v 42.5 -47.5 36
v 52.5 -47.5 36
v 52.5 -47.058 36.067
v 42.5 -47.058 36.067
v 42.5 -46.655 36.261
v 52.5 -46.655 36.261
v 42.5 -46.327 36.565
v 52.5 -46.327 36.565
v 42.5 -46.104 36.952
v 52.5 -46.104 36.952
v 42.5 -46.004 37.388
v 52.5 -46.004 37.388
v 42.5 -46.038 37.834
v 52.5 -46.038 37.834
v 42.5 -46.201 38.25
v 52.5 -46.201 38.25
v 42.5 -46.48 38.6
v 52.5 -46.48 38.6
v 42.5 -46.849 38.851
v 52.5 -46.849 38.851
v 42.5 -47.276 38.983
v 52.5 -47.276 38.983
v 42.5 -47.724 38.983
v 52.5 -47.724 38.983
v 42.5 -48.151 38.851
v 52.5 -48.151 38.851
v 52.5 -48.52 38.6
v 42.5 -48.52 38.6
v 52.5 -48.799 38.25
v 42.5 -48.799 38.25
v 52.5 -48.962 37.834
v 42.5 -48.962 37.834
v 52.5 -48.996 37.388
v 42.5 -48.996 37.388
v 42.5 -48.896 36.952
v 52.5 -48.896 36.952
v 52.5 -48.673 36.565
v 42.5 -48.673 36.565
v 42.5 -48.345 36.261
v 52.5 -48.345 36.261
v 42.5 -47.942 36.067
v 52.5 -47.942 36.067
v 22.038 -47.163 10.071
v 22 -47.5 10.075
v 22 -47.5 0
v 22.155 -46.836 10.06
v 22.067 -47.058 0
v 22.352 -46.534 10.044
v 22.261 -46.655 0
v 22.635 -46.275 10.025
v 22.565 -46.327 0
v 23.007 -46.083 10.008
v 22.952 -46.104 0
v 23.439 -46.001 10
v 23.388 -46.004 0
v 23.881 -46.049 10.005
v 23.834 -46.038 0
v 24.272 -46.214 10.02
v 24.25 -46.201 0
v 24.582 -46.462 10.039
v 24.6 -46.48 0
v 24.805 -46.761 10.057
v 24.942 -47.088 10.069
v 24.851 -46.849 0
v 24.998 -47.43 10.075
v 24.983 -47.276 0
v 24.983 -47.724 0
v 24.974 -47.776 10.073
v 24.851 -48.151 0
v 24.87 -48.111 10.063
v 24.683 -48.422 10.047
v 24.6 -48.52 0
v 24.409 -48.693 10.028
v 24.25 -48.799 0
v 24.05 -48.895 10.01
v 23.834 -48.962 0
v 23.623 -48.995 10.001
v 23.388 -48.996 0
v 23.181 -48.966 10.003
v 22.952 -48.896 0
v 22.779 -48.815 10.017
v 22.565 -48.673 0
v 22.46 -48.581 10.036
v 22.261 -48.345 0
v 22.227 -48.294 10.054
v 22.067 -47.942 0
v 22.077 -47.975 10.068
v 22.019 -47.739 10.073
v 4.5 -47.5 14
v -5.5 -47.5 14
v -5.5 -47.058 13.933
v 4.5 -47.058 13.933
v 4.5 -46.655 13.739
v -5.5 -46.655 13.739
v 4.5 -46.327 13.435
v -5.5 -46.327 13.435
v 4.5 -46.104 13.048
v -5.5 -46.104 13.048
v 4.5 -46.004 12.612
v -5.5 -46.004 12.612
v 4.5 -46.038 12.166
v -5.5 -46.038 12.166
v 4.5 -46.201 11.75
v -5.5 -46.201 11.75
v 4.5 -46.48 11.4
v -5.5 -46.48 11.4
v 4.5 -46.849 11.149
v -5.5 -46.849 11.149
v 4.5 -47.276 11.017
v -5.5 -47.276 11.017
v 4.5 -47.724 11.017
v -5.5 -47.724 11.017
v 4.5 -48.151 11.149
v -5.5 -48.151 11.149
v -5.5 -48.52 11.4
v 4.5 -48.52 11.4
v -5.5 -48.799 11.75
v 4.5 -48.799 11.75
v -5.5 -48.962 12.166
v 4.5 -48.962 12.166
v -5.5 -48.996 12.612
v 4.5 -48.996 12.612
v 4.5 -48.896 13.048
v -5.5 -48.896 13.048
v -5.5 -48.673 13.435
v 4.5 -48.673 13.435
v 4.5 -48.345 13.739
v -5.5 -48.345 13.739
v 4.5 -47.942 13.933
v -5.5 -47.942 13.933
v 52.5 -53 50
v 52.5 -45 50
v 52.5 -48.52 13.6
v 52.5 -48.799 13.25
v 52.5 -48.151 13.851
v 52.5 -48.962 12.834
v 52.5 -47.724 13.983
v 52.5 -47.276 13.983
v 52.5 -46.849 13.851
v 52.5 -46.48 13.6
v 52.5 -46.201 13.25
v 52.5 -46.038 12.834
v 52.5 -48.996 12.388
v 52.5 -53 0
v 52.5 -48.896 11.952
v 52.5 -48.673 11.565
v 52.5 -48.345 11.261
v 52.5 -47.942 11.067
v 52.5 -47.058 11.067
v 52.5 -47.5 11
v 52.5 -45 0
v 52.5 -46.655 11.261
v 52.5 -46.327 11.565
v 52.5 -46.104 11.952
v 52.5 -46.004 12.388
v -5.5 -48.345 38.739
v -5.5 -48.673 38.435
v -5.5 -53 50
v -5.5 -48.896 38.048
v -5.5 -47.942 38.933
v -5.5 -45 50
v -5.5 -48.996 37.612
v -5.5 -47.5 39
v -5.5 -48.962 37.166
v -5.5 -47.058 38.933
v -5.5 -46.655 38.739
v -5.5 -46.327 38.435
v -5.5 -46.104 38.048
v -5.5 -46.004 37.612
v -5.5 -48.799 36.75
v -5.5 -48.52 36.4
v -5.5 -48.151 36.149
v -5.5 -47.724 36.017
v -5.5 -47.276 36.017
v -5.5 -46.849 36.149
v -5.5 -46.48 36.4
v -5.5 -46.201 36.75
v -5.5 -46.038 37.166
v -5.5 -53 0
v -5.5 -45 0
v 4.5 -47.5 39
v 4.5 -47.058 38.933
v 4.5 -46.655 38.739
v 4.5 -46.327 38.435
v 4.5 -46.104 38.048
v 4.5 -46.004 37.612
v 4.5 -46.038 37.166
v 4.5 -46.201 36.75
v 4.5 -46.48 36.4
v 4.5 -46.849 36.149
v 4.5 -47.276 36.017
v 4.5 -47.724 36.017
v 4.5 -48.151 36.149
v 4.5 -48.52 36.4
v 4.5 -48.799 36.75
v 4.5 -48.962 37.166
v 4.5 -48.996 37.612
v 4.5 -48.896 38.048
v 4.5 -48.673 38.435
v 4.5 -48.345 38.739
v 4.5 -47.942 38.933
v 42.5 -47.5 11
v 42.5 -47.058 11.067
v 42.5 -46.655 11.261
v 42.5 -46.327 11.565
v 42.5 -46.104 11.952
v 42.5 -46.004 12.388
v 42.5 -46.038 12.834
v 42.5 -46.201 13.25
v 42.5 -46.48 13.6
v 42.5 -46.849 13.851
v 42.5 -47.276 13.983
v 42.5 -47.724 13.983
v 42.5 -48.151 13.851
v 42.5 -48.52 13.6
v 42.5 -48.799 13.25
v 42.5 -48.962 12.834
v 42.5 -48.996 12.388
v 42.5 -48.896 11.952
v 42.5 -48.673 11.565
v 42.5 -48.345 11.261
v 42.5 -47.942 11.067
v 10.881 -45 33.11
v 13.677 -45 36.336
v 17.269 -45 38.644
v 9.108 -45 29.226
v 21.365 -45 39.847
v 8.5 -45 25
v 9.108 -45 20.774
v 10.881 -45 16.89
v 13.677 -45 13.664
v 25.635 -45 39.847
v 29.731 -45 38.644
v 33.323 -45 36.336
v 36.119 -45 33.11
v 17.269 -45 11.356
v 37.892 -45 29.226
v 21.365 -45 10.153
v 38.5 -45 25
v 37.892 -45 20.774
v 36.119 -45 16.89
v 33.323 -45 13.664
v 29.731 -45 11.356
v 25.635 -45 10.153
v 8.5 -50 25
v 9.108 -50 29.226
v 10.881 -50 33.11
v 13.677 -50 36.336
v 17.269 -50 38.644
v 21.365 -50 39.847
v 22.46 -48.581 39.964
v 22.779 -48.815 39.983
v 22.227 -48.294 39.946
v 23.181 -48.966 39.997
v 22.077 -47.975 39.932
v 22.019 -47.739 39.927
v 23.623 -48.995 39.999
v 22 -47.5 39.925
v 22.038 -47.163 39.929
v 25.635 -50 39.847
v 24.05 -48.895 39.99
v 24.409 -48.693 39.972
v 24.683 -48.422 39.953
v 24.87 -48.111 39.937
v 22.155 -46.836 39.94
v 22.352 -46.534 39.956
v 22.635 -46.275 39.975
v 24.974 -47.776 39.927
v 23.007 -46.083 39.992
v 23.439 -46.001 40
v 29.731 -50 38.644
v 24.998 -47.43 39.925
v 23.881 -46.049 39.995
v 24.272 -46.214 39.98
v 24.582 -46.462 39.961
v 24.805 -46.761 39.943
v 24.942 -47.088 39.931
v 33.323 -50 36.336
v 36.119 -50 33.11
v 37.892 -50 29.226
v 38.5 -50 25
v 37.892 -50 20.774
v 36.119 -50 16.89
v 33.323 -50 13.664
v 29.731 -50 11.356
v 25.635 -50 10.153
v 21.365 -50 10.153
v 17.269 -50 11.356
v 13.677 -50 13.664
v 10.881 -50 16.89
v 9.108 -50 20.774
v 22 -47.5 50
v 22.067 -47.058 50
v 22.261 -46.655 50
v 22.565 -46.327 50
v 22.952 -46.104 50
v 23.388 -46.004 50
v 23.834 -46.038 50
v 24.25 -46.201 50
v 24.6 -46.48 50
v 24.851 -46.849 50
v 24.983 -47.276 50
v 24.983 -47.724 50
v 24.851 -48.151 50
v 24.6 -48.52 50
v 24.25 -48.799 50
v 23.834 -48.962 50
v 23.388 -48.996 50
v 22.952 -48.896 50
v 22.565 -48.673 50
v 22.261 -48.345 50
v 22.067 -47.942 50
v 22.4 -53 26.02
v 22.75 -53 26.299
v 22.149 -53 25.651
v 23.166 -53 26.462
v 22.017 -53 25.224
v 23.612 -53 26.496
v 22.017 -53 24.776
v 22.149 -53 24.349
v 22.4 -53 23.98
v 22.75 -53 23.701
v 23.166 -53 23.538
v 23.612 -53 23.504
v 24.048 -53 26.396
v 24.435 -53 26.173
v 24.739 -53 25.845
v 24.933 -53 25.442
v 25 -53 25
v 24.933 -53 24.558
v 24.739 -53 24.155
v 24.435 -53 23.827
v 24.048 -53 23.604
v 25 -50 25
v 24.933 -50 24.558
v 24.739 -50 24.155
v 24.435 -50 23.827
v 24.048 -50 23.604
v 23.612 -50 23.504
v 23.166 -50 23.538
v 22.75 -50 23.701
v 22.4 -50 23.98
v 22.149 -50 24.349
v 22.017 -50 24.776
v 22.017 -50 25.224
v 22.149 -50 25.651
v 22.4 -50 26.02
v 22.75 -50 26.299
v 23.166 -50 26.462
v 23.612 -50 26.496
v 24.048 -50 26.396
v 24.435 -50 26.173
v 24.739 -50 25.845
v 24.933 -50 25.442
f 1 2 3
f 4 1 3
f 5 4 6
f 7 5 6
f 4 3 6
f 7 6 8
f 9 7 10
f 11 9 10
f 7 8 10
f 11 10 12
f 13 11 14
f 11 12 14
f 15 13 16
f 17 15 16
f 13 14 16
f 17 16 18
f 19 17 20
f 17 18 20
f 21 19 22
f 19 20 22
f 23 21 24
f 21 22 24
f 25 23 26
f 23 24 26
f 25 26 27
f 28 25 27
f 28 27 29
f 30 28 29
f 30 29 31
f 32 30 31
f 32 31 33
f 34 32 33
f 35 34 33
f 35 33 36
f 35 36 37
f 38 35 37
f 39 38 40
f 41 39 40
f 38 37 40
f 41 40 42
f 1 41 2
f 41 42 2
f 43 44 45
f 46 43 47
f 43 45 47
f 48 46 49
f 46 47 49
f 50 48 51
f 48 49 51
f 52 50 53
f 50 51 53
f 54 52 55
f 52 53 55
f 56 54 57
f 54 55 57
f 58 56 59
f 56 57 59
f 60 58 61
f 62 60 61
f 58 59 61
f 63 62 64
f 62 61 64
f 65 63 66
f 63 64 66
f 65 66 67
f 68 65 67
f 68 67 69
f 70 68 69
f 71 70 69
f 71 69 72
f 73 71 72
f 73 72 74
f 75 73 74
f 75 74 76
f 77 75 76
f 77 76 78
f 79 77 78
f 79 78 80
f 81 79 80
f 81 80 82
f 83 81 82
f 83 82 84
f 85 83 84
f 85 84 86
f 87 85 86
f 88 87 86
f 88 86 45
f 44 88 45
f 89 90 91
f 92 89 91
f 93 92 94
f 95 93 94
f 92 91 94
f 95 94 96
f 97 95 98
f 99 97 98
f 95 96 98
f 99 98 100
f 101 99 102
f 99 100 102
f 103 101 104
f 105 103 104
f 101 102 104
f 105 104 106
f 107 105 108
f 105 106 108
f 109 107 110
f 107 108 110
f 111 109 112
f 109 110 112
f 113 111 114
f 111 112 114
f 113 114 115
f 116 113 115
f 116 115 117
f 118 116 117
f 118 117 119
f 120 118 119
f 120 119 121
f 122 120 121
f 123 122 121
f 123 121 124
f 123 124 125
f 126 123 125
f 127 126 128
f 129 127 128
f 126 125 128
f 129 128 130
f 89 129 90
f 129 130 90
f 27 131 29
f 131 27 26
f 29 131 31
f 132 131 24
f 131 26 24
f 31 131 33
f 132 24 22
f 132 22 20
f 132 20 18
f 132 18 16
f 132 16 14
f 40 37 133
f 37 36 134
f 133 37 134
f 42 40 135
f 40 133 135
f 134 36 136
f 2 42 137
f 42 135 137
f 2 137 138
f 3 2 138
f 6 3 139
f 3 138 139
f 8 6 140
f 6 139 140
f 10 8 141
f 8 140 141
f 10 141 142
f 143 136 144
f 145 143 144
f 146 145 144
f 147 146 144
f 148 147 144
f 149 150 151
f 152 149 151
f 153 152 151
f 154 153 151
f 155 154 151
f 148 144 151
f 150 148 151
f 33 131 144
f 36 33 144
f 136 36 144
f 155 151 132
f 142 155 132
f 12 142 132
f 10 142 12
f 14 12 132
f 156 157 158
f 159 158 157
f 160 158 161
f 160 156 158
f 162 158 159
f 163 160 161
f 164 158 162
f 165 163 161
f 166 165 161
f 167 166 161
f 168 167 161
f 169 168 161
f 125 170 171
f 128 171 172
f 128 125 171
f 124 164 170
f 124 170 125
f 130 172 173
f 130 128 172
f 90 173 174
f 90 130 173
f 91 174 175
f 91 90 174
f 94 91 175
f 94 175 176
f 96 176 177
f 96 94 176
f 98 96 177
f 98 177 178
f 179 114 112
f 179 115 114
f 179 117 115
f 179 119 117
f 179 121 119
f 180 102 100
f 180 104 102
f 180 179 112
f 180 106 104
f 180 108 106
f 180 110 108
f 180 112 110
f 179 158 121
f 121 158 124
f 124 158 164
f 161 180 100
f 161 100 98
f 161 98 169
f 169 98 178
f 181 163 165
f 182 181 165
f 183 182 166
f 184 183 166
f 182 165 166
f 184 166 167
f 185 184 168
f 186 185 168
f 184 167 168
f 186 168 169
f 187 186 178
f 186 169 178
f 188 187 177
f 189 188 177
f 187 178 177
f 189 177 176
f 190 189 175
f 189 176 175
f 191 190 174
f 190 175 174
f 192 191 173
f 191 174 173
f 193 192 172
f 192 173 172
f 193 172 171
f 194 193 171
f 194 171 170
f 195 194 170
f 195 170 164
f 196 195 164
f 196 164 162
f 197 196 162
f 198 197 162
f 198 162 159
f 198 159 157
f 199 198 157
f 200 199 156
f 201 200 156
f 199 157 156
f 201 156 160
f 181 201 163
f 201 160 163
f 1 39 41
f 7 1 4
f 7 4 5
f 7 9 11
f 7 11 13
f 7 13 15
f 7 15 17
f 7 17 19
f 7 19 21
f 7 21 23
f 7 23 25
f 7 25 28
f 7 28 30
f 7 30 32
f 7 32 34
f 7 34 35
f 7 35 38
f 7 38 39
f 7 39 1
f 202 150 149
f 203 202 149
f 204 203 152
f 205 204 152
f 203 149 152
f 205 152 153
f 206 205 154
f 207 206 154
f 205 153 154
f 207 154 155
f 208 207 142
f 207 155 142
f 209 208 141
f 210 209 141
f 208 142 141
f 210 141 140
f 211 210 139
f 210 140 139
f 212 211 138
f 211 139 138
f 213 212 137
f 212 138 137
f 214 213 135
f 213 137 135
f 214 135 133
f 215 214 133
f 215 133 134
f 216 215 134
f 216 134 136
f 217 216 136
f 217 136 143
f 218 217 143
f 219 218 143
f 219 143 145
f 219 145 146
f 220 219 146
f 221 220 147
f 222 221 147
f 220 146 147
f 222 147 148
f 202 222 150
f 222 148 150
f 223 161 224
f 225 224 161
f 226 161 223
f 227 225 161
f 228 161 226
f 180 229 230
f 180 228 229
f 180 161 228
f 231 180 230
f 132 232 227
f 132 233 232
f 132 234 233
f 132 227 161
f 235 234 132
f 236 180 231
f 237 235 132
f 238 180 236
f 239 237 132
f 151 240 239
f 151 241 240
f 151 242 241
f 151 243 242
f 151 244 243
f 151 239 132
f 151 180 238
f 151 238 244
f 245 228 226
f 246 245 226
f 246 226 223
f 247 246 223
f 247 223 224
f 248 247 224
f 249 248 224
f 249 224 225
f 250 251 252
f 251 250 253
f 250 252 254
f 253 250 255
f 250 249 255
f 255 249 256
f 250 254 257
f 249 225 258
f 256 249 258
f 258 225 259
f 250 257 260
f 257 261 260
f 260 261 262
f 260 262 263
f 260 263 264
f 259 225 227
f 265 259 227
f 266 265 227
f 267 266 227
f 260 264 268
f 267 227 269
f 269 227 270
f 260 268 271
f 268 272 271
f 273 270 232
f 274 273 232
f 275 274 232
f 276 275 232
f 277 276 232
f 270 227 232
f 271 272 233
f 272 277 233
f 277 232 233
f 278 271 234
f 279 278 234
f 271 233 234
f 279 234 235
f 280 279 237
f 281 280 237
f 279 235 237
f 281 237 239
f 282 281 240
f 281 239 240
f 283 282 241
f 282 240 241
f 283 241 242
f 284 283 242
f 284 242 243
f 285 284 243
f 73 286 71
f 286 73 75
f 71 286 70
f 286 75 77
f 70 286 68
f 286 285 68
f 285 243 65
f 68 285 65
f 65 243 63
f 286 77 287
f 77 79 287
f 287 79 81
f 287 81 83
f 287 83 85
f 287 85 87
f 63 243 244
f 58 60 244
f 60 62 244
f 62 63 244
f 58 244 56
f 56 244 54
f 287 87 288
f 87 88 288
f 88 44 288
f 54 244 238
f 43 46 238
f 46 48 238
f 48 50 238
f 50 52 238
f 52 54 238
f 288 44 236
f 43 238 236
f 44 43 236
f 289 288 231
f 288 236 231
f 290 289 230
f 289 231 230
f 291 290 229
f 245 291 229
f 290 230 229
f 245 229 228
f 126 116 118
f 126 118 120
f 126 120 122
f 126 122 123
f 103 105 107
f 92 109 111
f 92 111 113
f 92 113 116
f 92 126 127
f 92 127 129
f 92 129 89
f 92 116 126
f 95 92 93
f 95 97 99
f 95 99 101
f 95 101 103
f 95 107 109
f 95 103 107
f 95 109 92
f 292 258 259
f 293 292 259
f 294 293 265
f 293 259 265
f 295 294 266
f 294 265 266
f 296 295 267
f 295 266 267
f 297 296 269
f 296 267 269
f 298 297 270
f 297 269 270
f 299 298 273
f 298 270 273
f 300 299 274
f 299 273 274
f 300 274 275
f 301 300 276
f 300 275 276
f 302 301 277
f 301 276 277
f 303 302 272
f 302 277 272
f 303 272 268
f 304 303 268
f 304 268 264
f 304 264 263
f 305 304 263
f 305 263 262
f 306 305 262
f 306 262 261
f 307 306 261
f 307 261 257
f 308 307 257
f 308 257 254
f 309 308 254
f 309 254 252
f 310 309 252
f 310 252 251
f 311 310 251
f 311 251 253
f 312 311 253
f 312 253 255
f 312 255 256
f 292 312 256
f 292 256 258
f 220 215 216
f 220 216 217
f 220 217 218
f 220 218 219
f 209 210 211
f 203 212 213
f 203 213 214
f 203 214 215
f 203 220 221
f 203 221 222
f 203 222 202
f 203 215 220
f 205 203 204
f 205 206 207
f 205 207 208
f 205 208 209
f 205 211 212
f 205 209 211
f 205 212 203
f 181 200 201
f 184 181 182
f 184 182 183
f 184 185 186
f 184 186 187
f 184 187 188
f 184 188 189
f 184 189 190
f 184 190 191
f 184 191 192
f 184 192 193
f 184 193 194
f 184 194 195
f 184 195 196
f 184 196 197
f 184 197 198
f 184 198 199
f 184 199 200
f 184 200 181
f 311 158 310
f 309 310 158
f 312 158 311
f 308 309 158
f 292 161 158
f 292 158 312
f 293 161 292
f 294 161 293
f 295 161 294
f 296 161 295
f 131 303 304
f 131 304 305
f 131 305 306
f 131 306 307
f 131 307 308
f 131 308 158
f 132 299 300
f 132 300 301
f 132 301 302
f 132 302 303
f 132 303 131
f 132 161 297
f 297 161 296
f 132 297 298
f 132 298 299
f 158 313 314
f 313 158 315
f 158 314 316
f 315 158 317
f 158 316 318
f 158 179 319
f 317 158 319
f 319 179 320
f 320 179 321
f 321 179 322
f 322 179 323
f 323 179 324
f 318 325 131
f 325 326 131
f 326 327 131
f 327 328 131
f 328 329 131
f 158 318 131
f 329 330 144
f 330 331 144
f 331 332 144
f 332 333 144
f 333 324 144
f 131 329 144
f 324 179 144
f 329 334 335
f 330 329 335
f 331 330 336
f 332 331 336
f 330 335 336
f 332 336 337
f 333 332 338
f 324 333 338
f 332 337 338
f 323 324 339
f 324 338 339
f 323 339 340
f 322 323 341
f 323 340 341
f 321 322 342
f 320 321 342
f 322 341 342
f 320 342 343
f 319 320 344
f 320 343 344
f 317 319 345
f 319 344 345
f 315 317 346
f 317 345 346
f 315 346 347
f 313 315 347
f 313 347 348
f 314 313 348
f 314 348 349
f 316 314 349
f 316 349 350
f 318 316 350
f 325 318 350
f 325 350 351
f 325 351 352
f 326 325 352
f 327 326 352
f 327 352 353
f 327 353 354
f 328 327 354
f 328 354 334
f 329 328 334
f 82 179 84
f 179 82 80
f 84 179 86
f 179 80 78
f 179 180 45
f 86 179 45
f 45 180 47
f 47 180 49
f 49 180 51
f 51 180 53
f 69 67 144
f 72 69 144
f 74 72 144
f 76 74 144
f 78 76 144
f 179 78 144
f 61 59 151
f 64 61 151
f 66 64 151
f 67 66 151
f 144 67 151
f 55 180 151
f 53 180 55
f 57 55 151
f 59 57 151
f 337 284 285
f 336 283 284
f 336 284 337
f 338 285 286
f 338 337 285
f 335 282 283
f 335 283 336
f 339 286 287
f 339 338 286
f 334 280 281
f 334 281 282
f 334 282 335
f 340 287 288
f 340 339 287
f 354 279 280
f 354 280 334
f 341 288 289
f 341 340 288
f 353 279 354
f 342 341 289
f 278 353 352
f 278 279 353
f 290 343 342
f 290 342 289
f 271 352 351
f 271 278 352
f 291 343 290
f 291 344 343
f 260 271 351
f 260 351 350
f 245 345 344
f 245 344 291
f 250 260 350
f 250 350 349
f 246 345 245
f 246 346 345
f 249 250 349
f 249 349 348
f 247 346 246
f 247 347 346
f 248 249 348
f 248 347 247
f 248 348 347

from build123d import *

# Parameters (mm, degrees)
ESQUISSE1_W             = 58
ESQUISSE1_H             = 8
BOSS_EXTRU_1_DEPTH      = 50
ESQUISSE2_R             = 15
ENL_V_MAT_EXTRU_1_DEPTH = 5
ESQUISSE3_R             = 1.5
ENL_V_MAT_EXTRU_2_DEPTH = 10
ESQUISSE4_R             = 1.5
ENL_V_MAT_EXTRU_3_DEPTH = 10
ESQUISSE5_R             = 1.5
ENL_V_MAT_EXTRU_4_DEPTH = 4
ESQUISSE6_R             = 1.5
ENL_V_MAT_EXTRU_5_DEPTH = 51


with BuildPart() as part:
    # Esquisse1 → Boss.-Extru.1 (new body)
    with BuildSketch(Plane.XY):
        with Locations((23.5, -49)):
            Rectangle(ESQUISSE1_W, ESQUISSE1_H)
    extrude(amount=BOSS_EXTRU_1_DEPTH)

    # Esquisse2 → Enlèv. mat.-Extru.1 (cut)
    with BuildSketch(Plane(origin=(0, -45, 0), x_dir=(-1, 0, 0), z_dir=(0, 1, 0))):
        with Locations((-23.5, 25)):
            Circle(ESQUISSE2_R)
    extrude(amount=-ENL_V_MAT_EXTRU_1_DEPTH, mode=Mode.SUBTRACT)

    # Esquisse3 → Enlèv. mat.-Extru.2 (cut)
    with BuildSketch(Plane.ZY.offset(5.5)):
        with Locations((12.5, -47.5)):
            Circle(ESQUISSE3_R)
        with Locations((37.5, -47.5)):
            Circle(ESQUISSE3_R)
    extrude(amount=-ENL_V_MAT_EXTRU_2_DEPTH, mode=Mode.SUBTRACT)

    # Esquisse4 → Enlèv. mat.-Extru.3 (cut)
    with BuildSketch(Plane(origin=(52.5, 0, 0), x_dir=(0, 0, -1), z_dir=(1, 0, 0))):
        with Locations((-37.5, -47.5)):
            Circle(ESQUISSE4_R)
        with Locations((-12.5, -47.5)):
            Circle(ESQUISSE4_R)
    extrude(amount=-ENL_V_MAT_EXTRU_3_DEPTH, mode=Mode.SUBTRACT)

    # Esquisse5 → Enlèv. mat.-Extru.4 (cut, through all)
    with BuildSketch(Plane(origin=(0, -50, 0), x_dir=(1, 0, 0), z_dir=(0, 1, 0))):
        with Locations((23.5, -25)):
            Circle(ESQUISSE5_R)
    extrude(amount=-ENL_V_MAT_EXTRU_4_DEPTH, mode=Mode.SUBTRACT)

    # Esquisse6 → Enlèv. mat.-Extru.5 (cut, through all)
    with BuildSketch(Plane(origin=(0, 0, 0), x_dir=(-1, 0, 0), z_dir=(0, 0, -1))):
        with Locations((-23.5, -47.5)):
            Circle(ESQUISSE6_R)
    extrude(amount=-ENL_V_MAT_EXTRU_5_DEPTH, mode=Mode.SUBTRACT)


solid = part.part
